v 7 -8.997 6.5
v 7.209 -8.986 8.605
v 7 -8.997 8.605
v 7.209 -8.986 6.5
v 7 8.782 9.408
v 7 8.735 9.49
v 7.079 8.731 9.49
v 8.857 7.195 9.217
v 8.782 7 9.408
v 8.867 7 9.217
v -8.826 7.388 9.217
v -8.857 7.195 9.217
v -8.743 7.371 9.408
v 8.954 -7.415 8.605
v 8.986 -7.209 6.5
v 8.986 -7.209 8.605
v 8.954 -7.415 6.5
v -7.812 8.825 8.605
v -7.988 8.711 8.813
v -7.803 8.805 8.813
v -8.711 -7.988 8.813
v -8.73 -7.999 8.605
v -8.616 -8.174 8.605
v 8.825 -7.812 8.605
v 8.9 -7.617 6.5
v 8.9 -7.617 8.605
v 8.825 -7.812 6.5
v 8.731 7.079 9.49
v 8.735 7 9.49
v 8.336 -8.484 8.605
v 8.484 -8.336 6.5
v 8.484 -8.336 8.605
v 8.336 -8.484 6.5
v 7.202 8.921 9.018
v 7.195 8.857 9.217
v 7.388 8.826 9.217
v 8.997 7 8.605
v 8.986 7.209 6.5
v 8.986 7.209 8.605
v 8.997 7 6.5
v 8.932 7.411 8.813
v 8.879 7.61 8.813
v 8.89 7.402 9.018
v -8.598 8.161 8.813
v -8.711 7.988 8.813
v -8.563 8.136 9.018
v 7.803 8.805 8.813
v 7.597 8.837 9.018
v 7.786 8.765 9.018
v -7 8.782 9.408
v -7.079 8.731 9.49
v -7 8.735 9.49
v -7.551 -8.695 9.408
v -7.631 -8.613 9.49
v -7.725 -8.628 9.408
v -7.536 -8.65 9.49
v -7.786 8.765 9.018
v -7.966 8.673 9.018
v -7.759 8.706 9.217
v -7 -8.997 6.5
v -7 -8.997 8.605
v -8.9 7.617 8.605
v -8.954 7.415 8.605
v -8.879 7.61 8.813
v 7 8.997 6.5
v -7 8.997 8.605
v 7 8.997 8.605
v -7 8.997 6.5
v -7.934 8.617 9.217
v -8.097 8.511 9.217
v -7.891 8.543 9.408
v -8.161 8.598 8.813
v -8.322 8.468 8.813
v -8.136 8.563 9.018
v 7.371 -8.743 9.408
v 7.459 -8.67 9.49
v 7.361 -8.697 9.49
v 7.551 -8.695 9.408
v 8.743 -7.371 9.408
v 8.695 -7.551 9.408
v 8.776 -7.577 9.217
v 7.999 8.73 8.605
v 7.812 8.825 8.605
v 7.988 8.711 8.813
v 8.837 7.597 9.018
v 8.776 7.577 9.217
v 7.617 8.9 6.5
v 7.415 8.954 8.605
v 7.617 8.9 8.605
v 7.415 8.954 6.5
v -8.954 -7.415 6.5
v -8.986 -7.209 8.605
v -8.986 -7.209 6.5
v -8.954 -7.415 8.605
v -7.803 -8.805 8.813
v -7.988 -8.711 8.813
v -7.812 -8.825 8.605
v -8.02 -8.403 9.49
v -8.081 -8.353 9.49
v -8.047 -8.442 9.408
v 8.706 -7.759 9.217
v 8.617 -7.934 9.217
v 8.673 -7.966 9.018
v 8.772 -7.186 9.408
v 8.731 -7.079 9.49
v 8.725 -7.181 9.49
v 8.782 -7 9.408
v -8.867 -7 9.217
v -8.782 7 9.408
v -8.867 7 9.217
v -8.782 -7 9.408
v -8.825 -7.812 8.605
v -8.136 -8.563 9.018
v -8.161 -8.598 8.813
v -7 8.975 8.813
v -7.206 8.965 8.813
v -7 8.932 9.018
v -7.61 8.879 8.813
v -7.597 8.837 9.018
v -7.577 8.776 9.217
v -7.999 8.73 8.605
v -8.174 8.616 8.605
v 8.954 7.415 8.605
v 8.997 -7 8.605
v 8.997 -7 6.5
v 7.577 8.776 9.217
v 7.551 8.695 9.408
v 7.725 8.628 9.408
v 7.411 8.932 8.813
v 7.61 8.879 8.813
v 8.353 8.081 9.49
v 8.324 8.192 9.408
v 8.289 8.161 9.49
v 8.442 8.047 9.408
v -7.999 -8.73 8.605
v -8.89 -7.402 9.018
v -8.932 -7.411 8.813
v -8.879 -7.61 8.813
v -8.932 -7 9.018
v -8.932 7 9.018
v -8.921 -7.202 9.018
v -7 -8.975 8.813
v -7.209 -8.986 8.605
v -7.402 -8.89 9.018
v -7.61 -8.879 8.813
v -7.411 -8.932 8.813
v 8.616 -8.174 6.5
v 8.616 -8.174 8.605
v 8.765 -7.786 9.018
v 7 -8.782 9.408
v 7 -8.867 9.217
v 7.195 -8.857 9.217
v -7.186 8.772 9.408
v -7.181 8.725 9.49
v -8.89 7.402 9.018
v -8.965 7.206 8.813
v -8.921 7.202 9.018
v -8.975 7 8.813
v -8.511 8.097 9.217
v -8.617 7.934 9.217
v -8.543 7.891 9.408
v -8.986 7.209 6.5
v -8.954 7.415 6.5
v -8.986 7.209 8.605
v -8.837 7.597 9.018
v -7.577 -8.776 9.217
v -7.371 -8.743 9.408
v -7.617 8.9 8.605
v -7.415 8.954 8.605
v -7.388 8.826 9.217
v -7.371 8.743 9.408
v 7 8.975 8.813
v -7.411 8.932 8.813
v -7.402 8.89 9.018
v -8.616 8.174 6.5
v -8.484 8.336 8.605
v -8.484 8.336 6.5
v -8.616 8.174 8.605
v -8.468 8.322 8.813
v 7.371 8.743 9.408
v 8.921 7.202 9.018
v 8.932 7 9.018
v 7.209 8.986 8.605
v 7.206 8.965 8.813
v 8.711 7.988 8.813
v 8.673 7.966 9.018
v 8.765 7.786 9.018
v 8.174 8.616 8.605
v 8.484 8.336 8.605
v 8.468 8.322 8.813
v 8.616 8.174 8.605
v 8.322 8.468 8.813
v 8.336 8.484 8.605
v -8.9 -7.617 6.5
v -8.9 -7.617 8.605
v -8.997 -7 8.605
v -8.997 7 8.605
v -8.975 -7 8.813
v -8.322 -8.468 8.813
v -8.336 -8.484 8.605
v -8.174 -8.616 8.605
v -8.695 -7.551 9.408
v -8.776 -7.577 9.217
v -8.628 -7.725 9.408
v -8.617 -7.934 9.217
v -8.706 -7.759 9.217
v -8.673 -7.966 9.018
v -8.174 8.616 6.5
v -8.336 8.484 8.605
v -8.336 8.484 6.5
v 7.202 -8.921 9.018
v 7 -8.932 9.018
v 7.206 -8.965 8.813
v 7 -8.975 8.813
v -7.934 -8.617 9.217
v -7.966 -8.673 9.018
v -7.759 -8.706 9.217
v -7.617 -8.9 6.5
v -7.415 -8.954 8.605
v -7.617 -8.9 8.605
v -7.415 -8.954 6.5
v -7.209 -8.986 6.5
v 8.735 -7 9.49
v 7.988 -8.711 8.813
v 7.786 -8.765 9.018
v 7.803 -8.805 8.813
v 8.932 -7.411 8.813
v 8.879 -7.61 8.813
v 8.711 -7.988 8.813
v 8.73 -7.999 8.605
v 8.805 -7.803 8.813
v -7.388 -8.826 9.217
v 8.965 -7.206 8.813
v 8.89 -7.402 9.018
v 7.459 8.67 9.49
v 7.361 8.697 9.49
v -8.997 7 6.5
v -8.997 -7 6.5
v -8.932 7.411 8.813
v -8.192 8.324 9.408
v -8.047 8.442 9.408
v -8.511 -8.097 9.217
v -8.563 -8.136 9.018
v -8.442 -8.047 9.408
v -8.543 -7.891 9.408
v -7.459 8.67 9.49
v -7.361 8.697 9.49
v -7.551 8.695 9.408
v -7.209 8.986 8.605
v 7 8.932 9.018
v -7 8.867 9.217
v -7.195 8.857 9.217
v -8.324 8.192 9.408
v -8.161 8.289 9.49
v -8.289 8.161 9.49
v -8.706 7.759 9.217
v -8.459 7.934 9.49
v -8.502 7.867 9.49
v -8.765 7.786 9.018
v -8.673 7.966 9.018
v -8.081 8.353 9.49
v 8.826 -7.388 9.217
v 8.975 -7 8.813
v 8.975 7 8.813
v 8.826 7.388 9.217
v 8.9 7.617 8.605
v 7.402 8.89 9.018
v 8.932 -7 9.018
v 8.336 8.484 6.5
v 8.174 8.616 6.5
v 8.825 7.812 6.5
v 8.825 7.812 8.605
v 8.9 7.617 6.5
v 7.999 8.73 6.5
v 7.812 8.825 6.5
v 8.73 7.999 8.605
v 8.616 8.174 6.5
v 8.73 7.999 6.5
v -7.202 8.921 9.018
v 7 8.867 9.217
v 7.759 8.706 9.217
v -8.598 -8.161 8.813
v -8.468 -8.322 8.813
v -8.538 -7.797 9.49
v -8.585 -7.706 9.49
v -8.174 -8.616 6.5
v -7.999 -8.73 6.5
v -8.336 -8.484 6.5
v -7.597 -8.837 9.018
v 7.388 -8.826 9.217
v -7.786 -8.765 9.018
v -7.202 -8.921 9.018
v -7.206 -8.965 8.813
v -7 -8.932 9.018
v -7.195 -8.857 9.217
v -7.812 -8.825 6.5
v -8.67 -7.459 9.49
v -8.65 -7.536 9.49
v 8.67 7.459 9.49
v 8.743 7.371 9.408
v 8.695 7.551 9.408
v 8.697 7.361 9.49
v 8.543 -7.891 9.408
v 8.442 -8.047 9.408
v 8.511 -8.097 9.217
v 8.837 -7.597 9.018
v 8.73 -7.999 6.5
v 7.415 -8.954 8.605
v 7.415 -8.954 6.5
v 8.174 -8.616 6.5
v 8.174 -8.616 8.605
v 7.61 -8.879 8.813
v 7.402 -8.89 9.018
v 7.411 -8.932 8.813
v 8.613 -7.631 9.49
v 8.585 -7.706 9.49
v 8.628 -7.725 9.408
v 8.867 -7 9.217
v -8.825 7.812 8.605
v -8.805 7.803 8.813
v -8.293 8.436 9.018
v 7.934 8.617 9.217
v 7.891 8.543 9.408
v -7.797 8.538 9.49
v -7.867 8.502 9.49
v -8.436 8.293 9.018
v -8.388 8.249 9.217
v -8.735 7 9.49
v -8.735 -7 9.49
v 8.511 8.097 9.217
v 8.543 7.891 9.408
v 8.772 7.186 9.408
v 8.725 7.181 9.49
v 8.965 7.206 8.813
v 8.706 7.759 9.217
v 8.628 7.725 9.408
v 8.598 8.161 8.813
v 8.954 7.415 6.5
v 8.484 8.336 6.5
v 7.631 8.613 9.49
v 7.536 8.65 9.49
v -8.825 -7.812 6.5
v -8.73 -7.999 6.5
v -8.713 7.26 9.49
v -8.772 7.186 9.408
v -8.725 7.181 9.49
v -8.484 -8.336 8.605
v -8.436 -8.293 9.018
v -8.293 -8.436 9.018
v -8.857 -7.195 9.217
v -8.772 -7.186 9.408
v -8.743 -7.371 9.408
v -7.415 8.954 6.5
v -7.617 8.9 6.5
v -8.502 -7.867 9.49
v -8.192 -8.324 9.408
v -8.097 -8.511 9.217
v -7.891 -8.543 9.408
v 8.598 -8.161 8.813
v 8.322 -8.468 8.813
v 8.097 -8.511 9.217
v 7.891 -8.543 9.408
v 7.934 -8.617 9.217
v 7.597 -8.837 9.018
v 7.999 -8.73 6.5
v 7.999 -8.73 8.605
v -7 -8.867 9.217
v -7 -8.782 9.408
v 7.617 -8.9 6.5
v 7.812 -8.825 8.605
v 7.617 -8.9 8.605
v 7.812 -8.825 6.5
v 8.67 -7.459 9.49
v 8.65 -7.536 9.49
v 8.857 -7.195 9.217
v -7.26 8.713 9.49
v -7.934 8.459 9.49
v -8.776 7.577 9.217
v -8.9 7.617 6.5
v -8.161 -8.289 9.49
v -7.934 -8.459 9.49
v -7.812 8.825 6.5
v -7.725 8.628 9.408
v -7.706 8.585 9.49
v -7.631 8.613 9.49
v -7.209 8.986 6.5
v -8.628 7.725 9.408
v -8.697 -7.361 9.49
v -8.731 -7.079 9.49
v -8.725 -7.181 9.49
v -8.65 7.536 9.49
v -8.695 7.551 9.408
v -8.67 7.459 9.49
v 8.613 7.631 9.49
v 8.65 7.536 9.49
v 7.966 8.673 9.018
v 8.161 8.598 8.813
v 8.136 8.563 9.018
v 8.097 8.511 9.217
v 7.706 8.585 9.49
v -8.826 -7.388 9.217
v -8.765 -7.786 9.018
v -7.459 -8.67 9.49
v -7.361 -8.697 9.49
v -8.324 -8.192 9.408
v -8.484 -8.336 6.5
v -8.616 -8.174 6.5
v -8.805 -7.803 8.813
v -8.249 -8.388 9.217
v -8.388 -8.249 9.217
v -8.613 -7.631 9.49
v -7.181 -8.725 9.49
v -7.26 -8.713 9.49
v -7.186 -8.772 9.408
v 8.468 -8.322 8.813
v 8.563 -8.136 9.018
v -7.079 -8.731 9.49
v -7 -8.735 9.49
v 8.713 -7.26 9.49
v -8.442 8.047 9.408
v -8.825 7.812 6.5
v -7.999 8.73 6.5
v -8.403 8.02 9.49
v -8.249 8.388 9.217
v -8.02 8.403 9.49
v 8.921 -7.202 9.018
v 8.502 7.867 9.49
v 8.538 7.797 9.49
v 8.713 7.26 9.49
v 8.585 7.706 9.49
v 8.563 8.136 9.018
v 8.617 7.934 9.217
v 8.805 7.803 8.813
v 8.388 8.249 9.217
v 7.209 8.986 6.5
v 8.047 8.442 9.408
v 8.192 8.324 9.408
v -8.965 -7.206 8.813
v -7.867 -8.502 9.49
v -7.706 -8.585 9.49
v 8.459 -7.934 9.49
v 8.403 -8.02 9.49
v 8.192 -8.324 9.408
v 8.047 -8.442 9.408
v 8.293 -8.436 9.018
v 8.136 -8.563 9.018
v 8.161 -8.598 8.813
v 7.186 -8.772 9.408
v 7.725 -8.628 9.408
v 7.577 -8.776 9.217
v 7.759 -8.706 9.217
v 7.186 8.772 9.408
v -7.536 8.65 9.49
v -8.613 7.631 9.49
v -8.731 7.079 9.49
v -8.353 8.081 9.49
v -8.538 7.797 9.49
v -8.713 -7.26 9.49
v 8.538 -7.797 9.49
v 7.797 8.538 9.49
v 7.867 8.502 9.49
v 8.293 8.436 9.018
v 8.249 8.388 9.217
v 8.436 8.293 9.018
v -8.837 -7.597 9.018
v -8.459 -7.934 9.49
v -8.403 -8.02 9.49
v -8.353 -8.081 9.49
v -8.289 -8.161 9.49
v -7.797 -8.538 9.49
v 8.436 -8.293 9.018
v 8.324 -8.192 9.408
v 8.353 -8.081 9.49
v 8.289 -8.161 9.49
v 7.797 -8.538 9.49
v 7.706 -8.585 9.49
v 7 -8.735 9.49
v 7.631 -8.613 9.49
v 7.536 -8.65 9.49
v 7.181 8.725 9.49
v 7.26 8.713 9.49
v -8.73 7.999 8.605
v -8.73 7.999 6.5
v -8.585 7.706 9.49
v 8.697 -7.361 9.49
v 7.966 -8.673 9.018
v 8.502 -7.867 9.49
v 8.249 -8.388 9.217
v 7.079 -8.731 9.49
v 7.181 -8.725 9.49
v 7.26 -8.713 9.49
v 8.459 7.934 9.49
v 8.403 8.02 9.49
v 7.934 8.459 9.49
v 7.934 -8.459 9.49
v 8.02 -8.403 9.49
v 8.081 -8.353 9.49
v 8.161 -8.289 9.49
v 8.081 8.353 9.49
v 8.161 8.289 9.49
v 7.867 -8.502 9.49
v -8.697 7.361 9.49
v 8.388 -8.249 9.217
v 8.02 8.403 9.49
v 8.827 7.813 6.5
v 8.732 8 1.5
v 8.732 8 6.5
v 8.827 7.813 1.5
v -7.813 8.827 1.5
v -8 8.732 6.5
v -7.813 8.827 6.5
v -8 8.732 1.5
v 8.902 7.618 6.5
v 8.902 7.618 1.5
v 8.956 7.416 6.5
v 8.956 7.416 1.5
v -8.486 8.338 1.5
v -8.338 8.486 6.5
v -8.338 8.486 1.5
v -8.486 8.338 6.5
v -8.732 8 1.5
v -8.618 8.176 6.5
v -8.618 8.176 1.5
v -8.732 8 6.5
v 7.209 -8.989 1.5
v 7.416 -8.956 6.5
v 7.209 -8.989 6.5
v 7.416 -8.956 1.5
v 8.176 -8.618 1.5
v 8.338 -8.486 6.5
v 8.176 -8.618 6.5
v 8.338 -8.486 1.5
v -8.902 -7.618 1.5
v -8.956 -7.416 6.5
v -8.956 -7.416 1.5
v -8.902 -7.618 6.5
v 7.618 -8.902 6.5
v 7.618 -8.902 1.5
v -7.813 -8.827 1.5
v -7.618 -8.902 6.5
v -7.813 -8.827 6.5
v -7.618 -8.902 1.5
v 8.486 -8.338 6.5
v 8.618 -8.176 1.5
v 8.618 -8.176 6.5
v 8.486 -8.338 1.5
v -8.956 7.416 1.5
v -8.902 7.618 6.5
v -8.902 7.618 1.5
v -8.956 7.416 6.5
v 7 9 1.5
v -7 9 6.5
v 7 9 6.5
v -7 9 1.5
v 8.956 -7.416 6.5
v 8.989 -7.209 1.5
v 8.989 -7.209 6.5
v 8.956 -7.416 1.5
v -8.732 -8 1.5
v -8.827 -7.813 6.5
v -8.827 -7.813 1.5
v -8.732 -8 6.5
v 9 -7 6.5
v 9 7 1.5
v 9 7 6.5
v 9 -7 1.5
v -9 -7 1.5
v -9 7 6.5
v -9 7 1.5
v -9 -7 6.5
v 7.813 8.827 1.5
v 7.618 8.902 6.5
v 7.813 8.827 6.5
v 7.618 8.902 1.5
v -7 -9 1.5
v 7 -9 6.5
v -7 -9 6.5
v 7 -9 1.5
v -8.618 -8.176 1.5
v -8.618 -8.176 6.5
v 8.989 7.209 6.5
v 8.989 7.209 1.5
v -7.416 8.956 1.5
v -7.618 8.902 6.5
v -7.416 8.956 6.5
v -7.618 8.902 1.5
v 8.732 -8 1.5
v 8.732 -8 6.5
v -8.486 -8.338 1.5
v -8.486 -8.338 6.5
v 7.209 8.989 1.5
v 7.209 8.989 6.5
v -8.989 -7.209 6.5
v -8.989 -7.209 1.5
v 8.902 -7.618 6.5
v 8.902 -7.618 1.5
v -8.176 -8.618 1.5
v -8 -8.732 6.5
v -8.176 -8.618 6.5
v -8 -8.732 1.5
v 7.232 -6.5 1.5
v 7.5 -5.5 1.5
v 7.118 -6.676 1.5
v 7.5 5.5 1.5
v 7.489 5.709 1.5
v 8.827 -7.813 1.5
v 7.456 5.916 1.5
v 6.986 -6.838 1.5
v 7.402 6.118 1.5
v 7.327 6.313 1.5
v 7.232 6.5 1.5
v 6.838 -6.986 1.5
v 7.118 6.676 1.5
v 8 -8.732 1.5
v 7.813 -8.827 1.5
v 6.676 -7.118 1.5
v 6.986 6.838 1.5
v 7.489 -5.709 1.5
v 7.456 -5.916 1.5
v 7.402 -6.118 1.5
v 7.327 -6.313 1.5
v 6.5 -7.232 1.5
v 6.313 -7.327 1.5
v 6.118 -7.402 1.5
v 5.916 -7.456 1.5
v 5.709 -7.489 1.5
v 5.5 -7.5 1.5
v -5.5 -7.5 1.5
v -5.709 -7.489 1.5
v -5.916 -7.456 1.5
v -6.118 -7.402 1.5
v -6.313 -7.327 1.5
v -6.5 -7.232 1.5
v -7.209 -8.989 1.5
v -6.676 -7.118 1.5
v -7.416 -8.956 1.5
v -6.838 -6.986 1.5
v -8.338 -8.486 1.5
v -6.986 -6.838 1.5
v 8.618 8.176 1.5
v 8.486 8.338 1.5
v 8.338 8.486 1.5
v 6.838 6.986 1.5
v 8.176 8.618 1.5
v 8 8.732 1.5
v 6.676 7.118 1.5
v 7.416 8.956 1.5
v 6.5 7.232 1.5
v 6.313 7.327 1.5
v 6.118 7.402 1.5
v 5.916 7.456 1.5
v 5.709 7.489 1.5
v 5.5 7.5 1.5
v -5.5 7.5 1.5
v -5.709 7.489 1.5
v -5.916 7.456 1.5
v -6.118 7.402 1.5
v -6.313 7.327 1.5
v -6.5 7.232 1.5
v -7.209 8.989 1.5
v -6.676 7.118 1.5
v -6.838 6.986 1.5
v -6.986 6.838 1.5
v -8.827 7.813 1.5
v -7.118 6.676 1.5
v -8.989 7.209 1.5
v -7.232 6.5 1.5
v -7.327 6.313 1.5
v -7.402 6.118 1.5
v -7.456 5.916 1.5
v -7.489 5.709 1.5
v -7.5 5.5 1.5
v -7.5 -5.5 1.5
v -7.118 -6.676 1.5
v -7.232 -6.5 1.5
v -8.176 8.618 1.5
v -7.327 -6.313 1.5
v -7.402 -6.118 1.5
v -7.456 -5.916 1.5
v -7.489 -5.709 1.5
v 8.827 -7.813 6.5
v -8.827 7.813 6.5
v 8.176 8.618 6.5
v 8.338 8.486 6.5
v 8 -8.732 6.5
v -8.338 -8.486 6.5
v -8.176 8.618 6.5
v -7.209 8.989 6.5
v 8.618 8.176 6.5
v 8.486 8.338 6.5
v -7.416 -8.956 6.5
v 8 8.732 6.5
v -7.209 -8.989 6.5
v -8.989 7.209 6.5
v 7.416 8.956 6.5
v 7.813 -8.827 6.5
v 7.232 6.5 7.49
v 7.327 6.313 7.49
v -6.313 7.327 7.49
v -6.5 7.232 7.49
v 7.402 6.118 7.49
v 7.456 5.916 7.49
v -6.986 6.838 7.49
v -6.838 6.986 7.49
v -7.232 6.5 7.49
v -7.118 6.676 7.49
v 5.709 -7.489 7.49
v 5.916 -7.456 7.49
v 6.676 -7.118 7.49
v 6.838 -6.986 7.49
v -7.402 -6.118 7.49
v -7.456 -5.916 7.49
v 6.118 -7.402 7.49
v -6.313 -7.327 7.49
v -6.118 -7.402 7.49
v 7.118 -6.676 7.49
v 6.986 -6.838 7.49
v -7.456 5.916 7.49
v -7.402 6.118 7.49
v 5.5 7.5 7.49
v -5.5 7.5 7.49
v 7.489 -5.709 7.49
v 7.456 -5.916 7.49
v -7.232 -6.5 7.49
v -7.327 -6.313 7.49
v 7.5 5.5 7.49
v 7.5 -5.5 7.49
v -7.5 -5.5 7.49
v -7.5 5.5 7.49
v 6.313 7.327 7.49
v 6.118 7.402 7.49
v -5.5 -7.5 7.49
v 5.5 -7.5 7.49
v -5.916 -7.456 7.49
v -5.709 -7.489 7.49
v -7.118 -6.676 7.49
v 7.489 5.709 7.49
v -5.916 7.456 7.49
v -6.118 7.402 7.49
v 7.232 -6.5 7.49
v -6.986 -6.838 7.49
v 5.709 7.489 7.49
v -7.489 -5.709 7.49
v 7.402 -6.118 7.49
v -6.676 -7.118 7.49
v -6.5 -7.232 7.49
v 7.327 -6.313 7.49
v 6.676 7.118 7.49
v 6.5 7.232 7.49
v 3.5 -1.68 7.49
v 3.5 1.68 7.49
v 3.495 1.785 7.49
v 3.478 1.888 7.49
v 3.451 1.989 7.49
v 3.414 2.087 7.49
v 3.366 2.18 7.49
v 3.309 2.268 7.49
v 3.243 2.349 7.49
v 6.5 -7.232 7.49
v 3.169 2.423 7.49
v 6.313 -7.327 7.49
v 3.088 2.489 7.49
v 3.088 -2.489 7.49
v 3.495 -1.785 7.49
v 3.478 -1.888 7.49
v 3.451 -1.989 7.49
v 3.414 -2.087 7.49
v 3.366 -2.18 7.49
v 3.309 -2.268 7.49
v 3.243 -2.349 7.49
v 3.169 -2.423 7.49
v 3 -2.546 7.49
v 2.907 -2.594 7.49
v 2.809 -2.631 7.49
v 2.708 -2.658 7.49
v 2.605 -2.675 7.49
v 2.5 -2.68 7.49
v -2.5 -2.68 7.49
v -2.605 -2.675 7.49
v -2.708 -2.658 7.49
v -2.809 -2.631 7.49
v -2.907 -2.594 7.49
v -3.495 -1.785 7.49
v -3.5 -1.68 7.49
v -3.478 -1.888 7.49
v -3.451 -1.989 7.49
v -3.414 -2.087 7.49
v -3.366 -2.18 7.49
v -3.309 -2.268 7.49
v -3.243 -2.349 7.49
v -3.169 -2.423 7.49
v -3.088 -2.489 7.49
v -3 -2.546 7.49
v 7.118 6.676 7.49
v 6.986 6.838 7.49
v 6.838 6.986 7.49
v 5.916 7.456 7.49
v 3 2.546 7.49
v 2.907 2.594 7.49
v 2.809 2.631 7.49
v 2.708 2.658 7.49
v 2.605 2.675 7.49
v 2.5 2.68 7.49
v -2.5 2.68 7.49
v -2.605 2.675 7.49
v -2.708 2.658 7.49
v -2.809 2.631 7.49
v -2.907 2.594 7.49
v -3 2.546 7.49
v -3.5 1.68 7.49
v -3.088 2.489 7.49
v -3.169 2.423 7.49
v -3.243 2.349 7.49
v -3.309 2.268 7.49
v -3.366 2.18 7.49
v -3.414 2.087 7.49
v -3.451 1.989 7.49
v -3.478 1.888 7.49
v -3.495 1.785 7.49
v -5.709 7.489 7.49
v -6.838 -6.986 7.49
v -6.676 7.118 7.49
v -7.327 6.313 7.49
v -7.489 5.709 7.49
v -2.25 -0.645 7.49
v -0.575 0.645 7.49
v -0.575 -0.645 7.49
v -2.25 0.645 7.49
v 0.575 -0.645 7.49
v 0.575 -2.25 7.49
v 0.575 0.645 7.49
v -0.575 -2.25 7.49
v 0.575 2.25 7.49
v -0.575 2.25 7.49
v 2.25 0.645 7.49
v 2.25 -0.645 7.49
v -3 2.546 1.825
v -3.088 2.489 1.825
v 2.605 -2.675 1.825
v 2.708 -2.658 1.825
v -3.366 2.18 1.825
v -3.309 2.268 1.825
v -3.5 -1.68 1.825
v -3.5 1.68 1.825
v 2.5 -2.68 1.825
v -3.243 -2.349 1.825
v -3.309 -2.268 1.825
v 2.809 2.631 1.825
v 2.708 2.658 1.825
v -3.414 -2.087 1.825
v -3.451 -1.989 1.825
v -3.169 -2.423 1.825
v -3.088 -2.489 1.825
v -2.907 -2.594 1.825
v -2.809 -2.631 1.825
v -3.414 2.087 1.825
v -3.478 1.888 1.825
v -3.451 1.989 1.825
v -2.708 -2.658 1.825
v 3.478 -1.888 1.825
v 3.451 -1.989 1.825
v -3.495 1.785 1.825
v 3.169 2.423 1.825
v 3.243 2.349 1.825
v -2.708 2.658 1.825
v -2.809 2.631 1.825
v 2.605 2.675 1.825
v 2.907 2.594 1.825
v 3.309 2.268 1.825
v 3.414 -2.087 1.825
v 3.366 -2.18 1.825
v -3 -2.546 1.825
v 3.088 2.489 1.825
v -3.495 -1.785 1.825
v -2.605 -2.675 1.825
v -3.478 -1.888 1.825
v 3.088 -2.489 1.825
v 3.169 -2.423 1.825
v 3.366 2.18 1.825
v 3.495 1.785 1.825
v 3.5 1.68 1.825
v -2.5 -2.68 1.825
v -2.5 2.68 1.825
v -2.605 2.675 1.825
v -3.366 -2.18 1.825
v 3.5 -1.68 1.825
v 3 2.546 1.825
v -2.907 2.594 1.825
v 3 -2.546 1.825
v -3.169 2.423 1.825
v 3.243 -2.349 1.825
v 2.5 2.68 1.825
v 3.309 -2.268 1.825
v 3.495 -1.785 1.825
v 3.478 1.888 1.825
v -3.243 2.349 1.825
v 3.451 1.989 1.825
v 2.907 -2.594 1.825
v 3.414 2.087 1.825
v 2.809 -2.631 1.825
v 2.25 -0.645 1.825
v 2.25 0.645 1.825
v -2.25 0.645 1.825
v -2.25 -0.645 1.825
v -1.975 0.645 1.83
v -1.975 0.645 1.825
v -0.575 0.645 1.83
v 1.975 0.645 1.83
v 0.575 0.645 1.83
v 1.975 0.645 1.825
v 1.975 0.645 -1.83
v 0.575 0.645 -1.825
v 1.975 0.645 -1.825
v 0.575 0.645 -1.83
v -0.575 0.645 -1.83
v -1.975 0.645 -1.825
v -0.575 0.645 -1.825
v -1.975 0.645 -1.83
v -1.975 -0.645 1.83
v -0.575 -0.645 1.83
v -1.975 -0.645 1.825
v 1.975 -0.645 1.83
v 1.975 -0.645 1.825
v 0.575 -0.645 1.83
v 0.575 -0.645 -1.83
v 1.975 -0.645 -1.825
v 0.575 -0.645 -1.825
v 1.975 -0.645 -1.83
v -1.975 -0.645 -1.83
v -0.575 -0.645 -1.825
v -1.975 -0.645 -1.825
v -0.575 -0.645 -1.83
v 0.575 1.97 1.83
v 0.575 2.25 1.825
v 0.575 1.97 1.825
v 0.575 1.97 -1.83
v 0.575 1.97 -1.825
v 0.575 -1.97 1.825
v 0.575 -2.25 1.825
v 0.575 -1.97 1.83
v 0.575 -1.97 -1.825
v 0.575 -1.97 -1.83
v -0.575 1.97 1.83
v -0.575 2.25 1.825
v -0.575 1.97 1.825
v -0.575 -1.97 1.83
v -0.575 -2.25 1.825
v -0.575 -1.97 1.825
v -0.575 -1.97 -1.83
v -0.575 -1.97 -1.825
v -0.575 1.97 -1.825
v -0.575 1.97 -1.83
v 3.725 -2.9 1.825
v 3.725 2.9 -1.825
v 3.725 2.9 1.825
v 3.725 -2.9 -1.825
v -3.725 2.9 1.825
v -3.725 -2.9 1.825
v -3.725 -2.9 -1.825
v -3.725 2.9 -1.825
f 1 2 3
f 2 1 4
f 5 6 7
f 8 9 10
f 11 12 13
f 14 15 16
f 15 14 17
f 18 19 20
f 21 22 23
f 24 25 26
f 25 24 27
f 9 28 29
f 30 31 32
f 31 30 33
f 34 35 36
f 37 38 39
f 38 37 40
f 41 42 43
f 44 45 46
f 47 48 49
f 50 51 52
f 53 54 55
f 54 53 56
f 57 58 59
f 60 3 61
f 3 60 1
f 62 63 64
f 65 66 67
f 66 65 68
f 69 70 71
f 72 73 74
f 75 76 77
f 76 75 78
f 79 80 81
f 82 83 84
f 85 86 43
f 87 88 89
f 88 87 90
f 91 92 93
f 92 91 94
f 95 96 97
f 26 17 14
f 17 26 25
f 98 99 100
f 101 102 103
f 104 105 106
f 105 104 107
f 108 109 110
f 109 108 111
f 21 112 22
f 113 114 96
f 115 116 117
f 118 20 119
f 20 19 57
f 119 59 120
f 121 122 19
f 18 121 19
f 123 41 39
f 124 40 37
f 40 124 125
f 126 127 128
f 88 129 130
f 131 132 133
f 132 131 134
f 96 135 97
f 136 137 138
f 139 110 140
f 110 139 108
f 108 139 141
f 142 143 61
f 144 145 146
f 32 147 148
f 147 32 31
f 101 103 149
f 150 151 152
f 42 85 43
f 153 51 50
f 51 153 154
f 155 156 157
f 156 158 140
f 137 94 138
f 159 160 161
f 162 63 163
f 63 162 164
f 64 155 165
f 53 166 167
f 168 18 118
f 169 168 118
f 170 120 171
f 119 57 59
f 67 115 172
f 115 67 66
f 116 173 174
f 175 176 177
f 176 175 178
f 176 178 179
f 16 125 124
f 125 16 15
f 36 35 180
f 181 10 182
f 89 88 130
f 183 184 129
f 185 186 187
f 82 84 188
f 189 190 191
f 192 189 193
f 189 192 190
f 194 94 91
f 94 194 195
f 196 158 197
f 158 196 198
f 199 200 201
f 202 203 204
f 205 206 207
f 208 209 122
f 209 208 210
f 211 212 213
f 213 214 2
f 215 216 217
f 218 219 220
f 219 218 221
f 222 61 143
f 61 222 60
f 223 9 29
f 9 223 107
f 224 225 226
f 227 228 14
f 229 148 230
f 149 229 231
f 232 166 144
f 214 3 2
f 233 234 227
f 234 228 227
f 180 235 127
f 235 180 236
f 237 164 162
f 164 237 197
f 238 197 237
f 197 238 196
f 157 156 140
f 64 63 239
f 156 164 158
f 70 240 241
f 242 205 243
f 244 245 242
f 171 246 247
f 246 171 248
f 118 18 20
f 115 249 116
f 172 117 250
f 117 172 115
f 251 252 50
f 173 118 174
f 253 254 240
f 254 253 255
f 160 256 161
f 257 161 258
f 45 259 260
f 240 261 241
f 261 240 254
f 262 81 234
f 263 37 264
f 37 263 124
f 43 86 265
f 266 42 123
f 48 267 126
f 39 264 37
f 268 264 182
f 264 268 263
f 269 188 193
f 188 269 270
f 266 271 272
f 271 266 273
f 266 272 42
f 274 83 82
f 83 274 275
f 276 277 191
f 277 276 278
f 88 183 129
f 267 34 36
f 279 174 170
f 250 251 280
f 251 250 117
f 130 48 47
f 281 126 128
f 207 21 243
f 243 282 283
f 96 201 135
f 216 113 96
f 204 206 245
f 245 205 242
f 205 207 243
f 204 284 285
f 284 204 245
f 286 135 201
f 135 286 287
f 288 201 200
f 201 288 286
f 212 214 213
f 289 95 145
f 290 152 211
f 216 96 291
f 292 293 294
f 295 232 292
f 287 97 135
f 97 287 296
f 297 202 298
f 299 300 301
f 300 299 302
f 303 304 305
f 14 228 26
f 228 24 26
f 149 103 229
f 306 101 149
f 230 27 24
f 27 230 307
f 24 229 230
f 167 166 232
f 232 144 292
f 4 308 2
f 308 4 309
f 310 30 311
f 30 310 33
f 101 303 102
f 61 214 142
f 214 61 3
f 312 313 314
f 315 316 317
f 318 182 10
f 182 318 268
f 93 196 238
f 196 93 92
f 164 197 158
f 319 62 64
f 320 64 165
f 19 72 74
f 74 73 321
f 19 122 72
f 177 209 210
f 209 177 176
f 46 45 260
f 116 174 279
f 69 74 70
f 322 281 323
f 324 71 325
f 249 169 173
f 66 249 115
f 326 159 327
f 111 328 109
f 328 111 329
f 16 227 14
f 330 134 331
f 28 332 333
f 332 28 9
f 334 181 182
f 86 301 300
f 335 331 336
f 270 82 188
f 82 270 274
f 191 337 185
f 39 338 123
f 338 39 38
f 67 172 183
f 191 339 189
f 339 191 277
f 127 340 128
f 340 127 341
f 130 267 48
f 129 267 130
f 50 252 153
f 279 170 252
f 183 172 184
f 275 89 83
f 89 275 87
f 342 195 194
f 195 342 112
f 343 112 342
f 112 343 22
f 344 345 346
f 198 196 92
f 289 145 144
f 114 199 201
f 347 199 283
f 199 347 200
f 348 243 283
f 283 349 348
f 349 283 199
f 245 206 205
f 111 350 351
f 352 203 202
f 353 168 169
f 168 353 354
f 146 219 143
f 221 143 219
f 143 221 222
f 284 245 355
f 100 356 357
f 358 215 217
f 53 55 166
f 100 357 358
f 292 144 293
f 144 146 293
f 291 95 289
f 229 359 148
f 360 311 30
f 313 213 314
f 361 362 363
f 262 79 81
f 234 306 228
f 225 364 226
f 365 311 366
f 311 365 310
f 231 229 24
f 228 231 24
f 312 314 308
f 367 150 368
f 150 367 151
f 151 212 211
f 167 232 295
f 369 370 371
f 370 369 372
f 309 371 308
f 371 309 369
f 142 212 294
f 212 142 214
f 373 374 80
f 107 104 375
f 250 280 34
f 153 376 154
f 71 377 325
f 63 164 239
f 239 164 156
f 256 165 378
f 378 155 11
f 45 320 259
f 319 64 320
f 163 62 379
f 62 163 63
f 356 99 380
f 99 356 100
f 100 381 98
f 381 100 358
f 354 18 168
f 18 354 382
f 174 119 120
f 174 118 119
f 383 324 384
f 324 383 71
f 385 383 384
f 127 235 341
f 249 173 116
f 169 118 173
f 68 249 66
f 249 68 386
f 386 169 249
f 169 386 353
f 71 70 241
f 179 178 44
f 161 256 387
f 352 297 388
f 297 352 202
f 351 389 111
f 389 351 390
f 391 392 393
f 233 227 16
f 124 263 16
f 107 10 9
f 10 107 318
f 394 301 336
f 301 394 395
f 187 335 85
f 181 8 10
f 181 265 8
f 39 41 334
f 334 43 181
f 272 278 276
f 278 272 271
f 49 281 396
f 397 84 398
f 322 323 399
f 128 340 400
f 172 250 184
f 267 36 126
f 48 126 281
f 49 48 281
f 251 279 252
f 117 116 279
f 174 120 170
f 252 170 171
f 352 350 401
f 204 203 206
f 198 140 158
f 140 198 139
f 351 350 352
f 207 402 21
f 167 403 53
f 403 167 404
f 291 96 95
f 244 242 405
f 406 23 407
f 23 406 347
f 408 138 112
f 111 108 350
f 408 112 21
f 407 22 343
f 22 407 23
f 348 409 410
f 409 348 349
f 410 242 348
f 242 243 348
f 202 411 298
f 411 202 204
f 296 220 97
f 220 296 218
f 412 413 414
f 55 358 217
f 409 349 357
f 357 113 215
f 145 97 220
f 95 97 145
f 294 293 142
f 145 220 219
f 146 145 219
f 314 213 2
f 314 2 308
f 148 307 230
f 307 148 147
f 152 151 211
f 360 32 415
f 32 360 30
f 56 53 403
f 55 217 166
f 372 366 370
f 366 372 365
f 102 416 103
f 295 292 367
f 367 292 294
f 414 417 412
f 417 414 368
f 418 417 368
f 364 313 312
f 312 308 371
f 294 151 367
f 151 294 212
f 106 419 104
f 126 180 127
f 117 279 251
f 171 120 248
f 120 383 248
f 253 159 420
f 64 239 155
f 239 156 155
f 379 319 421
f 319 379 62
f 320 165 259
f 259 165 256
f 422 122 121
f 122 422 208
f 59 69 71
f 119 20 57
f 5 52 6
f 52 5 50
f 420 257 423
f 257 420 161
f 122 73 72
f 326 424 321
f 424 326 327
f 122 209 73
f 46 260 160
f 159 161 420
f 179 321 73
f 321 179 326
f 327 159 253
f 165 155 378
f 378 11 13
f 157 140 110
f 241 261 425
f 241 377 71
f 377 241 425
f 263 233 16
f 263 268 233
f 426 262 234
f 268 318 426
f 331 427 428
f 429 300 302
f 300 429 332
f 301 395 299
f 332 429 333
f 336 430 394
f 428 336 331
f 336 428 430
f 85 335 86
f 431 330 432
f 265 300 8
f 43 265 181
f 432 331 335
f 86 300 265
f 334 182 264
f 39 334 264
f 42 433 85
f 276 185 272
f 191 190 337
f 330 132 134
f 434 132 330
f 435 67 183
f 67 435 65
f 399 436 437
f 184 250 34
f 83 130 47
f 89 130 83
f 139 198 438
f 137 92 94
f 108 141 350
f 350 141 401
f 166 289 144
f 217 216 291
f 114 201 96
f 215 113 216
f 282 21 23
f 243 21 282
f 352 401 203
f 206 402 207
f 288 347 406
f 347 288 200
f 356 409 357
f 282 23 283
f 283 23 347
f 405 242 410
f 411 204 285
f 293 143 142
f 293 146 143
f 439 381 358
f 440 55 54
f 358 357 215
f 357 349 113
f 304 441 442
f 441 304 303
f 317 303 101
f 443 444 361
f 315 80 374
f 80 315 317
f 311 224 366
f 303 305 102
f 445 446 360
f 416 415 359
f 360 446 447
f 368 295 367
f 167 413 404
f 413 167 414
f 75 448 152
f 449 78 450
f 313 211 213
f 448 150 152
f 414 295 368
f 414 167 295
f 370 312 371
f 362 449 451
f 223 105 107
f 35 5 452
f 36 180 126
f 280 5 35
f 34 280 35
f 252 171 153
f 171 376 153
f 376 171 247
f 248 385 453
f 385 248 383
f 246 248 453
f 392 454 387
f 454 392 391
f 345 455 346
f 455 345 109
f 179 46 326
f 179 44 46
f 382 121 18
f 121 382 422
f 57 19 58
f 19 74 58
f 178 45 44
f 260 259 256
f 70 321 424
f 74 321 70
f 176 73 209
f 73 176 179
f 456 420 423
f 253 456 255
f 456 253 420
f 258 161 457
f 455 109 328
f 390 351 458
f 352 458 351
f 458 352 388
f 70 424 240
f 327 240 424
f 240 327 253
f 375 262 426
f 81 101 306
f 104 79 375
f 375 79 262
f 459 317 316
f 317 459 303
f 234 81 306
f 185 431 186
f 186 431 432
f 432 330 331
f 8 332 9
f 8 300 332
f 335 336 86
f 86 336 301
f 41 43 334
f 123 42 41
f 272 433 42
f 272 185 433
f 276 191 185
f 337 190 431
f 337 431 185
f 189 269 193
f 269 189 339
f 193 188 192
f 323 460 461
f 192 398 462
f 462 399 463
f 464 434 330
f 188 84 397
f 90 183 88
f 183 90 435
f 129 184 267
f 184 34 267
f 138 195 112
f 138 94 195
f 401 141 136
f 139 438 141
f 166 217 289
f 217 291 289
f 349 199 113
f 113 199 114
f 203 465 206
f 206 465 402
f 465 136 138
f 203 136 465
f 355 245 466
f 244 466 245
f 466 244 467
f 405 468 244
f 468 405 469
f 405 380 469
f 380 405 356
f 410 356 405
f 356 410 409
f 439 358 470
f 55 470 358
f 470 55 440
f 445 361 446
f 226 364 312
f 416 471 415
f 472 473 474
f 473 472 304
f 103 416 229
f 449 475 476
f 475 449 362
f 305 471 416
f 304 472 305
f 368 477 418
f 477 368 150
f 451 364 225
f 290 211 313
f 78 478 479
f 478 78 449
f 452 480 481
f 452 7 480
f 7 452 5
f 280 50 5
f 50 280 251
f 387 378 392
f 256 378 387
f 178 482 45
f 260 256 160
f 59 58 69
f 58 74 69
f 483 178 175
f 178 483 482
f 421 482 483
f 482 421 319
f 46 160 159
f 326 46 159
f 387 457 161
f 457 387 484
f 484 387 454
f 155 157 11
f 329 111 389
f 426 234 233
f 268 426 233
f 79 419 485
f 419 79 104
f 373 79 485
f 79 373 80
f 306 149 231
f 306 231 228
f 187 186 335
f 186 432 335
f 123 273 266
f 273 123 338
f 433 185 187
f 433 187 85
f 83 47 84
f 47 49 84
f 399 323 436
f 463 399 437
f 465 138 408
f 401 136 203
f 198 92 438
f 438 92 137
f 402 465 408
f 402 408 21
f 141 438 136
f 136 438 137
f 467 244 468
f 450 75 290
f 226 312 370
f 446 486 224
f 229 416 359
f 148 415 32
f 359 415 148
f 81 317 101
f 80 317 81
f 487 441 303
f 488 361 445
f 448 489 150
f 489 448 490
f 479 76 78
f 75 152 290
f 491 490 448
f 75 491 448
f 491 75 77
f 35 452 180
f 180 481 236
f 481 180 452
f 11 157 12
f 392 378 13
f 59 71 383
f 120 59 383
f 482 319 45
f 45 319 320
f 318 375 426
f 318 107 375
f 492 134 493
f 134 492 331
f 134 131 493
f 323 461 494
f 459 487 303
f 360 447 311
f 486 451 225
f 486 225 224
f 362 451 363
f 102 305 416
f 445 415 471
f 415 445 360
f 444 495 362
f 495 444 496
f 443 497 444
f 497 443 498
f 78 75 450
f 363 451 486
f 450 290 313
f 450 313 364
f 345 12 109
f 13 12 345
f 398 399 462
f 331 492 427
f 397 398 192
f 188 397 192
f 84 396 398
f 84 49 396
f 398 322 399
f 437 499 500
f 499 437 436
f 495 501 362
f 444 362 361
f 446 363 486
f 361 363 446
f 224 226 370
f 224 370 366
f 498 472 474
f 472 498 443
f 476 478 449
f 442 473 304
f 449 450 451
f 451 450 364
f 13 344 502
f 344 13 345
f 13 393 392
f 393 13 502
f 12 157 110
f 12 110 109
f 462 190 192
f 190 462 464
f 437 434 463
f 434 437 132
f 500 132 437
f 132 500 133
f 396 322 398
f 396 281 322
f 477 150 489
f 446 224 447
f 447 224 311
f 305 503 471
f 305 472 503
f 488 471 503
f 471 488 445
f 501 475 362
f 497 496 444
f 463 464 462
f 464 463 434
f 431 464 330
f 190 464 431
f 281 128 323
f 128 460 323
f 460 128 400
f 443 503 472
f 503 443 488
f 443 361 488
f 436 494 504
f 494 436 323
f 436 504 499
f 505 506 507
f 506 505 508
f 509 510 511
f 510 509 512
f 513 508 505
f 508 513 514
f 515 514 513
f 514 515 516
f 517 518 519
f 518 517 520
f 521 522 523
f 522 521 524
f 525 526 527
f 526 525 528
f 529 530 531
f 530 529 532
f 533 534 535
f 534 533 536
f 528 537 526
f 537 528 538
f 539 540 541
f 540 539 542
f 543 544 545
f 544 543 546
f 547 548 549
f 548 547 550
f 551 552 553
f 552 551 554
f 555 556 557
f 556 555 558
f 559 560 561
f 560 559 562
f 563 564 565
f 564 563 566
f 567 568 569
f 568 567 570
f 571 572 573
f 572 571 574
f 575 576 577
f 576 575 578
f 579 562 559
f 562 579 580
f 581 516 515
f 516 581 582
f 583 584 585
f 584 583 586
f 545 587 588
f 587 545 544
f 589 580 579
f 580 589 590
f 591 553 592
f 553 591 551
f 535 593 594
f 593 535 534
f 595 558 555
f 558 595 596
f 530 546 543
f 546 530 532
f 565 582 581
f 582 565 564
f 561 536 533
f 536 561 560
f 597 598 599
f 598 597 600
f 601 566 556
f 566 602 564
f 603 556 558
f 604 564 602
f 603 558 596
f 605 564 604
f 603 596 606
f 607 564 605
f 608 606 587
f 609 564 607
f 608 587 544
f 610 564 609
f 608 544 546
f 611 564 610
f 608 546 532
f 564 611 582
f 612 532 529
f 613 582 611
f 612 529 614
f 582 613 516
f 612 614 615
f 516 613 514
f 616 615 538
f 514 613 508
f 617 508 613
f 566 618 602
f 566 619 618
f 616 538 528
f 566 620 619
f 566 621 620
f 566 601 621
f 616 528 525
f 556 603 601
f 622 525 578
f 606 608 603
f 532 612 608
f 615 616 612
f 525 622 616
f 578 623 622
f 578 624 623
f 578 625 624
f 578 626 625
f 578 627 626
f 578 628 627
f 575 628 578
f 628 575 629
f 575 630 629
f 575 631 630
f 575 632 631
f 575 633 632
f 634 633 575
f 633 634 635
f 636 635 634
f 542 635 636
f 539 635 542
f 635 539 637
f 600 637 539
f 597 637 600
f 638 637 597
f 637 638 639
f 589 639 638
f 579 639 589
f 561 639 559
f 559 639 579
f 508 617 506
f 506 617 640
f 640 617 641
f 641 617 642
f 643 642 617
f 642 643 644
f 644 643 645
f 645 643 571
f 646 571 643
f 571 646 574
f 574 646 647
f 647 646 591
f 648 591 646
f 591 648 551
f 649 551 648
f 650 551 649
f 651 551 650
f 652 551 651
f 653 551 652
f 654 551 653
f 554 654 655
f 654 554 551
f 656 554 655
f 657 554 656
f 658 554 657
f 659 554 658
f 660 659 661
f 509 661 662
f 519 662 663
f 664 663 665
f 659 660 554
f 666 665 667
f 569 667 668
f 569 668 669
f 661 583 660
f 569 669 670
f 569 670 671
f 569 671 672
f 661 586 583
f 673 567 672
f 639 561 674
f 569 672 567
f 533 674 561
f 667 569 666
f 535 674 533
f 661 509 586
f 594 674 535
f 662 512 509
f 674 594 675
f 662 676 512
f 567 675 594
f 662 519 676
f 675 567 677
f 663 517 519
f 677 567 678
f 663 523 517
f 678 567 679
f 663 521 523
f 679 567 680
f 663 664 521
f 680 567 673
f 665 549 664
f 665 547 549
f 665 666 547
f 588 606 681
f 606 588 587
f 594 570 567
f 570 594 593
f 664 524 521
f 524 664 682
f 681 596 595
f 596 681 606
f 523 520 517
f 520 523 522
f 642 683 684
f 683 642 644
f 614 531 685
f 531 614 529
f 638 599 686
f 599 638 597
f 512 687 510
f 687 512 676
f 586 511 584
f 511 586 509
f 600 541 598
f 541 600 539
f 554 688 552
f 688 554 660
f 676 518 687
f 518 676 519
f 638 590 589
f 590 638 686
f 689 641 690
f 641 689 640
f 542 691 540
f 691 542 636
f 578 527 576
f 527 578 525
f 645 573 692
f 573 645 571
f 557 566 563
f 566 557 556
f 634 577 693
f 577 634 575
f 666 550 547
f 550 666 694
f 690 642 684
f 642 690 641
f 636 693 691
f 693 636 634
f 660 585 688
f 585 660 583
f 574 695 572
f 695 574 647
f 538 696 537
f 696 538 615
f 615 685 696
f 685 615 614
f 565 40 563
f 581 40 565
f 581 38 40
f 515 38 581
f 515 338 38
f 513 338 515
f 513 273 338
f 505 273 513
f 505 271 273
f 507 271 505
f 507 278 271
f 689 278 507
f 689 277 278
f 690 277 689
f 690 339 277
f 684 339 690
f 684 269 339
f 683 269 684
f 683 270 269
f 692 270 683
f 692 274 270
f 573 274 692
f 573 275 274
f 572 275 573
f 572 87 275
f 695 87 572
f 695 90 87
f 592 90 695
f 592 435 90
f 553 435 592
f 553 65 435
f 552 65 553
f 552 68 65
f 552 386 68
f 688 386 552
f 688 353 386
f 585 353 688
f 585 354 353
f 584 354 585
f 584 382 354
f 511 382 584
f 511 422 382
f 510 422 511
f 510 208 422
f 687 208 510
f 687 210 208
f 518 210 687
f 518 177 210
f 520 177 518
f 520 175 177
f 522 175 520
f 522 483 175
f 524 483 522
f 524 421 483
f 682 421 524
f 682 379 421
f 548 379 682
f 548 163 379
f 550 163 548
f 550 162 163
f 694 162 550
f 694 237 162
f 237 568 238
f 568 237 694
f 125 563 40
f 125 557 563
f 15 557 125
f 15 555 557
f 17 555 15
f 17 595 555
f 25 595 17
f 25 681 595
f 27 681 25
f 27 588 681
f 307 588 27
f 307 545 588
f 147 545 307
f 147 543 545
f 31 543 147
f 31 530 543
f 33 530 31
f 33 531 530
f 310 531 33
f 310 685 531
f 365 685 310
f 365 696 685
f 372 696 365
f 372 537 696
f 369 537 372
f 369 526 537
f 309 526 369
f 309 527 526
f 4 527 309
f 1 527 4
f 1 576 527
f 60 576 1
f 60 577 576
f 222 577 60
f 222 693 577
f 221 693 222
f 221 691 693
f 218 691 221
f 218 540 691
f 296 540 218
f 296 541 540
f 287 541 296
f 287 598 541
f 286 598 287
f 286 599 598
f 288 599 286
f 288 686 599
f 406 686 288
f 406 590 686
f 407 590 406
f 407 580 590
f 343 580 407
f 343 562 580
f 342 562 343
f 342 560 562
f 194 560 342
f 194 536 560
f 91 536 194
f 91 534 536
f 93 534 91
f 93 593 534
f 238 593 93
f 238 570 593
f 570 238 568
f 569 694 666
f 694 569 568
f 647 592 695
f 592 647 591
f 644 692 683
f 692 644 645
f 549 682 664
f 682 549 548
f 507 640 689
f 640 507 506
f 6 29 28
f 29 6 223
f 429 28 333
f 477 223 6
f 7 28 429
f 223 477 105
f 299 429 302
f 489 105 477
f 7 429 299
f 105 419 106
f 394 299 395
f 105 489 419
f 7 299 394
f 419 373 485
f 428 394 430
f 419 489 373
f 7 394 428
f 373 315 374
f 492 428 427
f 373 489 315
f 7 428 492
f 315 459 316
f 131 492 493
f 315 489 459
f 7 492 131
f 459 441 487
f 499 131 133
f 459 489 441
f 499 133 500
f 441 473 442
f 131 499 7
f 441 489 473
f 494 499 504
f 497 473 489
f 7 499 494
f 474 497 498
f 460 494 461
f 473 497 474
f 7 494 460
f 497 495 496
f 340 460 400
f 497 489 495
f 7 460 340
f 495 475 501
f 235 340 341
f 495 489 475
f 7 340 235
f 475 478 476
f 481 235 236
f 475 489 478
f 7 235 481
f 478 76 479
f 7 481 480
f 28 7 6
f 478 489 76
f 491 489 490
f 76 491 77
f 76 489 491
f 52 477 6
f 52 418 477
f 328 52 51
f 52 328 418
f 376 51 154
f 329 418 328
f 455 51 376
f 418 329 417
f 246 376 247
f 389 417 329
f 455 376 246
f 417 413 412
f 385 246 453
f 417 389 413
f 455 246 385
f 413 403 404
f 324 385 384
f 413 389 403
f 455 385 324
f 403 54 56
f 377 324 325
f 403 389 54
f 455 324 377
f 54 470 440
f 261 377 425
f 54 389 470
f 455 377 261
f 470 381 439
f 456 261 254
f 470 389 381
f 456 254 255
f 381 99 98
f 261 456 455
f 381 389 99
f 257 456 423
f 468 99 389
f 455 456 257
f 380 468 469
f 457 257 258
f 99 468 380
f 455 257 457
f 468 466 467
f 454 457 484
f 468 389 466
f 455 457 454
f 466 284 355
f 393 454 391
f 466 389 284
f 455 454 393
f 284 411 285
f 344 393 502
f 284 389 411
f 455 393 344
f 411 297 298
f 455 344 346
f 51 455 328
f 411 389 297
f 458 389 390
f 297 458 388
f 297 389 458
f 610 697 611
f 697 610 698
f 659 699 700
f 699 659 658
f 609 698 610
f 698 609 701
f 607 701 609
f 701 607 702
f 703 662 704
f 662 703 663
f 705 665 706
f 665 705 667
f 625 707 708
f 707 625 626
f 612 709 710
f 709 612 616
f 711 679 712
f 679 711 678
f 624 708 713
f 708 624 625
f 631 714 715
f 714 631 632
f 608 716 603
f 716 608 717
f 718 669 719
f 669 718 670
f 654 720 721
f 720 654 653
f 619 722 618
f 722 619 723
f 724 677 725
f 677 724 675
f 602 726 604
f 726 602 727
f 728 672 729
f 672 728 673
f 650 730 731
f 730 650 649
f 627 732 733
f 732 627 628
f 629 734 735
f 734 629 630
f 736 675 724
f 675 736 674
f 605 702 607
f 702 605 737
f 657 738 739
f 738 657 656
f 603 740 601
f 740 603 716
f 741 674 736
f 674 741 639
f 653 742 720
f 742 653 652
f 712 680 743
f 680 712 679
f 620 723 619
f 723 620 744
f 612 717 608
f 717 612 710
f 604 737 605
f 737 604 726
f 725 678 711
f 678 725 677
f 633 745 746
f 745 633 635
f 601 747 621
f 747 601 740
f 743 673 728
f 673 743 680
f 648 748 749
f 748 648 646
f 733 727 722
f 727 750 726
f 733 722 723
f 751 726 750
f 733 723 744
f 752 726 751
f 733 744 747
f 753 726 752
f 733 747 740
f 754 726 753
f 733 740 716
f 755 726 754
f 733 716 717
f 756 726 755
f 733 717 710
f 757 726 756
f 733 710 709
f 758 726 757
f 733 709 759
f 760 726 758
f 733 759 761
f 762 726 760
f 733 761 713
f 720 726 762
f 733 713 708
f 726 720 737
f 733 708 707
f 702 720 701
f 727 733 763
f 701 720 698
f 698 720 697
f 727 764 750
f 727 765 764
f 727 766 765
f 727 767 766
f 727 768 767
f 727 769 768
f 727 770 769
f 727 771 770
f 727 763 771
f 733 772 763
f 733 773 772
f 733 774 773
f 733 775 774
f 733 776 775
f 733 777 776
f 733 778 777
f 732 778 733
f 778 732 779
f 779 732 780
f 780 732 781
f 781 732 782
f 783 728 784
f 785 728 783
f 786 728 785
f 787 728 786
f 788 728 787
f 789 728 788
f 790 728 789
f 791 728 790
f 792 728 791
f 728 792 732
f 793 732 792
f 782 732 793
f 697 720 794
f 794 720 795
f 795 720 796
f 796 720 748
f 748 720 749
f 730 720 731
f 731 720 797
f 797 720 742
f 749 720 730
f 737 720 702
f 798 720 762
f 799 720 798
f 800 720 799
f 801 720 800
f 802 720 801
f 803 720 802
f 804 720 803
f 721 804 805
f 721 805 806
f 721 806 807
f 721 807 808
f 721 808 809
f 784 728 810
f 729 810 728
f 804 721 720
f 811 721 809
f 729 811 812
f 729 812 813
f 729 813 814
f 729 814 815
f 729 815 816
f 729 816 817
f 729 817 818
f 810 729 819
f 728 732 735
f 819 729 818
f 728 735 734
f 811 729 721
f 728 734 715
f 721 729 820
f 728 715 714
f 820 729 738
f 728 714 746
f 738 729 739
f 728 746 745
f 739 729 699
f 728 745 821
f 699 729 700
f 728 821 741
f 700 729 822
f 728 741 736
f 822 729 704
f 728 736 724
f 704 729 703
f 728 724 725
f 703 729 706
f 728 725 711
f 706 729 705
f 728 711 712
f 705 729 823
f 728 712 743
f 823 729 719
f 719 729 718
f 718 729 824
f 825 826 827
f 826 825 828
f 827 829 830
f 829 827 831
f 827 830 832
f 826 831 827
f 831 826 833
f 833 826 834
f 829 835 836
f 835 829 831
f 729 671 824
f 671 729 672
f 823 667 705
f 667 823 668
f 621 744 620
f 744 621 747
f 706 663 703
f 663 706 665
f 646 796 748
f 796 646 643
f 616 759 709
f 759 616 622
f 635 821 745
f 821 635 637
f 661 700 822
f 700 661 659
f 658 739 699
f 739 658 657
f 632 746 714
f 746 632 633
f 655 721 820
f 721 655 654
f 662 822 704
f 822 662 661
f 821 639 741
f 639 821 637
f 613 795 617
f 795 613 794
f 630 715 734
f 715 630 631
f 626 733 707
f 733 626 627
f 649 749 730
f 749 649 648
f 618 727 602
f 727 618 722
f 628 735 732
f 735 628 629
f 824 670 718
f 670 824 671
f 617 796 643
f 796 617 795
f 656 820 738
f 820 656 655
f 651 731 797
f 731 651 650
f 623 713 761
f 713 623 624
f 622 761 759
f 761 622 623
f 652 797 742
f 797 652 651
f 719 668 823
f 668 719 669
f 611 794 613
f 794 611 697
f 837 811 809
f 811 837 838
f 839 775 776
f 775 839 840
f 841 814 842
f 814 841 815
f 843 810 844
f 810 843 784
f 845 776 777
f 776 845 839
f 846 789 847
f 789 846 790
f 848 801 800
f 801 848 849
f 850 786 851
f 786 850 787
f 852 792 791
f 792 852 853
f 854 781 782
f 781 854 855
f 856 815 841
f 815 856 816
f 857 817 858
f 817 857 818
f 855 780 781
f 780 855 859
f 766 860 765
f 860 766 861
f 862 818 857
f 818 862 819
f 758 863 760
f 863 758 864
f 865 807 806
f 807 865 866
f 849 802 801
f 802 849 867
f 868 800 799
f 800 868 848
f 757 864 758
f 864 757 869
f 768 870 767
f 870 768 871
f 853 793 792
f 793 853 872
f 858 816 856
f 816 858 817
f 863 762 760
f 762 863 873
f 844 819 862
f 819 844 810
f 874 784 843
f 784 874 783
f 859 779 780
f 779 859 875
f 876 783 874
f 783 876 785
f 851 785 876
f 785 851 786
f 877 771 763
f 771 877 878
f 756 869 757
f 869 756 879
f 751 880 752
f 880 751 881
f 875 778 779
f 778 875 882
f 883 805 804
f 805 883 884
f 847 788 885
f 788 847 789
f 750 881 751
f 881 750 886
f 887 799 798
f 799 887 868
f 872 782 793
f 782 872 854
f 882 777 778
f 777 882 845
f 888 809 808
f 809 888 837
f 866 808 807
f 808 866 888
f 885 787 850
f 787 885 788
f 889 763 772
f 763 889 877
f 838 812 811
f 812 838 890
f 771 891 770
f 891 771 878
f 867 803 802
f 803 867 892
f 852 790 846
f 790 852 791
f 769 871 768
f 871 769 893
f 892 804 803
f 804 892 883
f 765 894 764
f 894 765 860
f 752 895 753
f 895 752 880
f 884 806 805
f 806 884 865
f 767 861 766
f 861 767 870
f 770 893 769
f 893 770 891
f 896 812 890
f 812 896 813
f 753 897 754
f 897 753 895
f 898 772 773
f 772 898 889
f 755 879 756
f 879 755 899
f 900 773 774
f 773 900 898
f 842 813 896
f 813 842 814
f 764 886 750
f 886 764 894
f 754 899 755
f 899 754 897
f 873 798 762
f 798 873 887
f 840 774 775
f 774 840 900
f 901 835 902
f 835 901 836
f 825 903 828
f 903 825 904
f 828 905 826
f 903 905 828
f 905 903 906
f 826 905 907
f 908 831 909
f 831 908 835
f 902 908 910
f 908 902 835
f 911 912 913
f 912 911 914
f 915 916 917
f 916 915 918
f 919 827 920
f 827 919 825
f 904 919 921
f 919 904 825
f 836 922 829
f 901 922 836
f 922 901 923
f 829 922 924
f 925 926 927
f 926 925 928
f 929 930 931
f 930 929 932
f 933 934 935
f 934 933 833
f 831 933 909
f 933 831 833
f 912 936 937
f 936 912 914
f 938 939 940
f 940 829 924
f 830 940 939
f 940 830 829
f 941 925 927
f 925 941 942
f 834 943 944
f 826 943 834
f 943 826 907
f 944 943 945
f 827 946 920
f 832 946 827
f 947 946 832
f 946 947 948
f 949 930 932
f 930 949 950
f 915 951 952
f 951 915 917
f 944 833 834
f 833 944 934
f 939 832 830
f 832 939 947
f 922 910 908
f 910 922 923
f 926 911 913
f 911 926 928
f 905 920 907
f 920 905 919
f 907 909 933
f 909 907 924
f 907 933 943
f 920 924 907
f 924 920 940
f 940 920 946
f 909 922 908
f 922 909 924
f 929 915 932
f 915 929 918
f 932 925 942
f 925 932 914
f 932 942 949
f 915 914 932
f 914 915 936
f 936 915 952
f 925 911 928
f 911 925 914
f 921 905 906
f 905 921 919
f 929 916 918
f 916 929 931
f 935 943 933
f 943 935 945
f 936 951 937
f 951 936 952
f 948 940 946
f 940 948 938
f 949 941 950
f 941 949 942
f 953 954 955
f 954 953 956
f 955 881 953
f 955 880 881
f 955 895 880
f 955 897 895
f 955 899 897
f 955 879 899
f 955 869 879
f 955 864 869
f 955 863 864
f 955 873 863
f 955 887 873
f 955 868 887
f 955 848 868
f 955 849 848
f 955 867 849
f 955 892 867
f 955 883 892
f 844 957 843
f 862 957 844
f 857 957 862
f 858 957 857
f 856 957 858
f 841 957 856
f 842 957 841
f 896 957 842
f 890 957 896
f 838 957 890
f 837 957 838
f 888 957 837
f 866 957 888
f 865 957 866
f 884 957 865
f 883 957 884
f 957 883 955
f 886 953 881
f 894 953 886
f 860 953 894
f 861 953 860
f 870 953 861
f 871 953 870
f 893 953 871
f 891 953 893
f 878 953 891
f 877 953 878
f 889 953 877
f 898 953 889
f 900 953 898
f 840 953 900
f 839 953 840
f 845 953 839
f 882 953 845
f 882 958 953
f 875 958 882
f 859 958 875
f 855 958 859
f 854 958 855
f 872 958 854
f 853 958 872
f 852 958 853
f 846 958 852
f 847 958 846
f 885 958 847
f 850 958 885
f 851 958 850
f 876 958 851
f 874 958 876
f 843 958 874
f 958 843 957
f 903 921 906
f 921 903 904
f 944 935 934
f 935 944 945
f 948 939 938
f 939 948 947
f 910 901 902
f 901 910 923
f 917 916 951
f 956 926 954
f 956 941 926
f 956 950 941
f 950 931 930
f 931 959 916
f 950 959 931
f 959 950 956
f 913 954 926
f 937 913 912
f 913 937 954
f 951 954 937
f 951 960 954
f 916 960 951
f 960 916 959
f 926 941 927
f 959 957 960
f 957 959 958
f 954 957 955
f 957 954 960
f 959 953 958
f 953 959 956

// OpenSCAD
// Define higher resolution for transformations
$fn=60;

difference() {
union(){
    // keycap outside cupola
    difference() {
        union() {
            // rounded cap - top half
            translate([0,0, 7.5]) // half mil under ten
            roundedcube(18, 6, 2);

            // rounded sides - bottom half
            translate([0,0,1.5])
            sideroundedcube(18, 5, 2);
        };

        // top flattening
        translate([0,0,9.49])
        sideroundedcube(18, 6, 2);

        // internal cupola cutoff
        translate([0,0,1.49])
        sideroundedcube(15, 6, 2);
    }

    // fitting support
    translate([0, 0, 4.75])
    difference(){
        // housing fitting
        hull() {
            translate([2.50, 1.68, 0])   cylinder(6.5, 1, 1, true);
            translate([-2.50, 1.68, 0])  cylinder(6.5, 1, 1, true);
            translate([2.50, -1.68, 0])  cylinder(6.5, 1, 1, true);
            translate([-2.50, -1.68, 0]) cylinder(6.5, 1, 1, true);
        }
        // cross fitting cutoff
        cube([4.5, 1.29, 10], true);
        cube([1.15, 4.5, 10], true);
    }
}
// enable to see sliced
*translate([0, 5, 5]) cube([20, 10, 20], true);
}


// reference inner cupola cutoff
*translate([10,10,1.49])
sideroundedcube(16, 6, 2);

// height reference, with z offset for switch spacing
*translate([0,0,1.5])
cube([18, 18, 8]); // height = 8mm


/**
 * Reference fitting cross
 * The fitting cross on the kailh speed has been measured to be:
 * - horizontal : 1.27 to 1.29 thick, 3.95 in length, and 3.65 in height
 * - vertical   : 1.11 to 1.15 think, 3.95 in length, and 3.65 in height
 */
#union(){
    cube([3.95, 1.29, 3.66], true); // h
    cube([1.15, 3.94, 3.66], true); // v
 }

/**
 * Reference piston housing
 * The piston housing on the kailh speed has been measured to be:
 * - x : 7.47
 * - y : 5.81
 * - z : 3.65
 */
#cube([7.45, 5.8, 3.65], true);


module roundedcube(s, h, r) {
    minkowski() {
        cube([s-r*2, s-r*2, h-r*2], true);
        sphere(r);
    };
}

module sideroundedcube(s, h, r) {
    linear_extrude(height=h)
    minkowski() {
        square(s-r*2, true);
        circle(r);
    };
}
